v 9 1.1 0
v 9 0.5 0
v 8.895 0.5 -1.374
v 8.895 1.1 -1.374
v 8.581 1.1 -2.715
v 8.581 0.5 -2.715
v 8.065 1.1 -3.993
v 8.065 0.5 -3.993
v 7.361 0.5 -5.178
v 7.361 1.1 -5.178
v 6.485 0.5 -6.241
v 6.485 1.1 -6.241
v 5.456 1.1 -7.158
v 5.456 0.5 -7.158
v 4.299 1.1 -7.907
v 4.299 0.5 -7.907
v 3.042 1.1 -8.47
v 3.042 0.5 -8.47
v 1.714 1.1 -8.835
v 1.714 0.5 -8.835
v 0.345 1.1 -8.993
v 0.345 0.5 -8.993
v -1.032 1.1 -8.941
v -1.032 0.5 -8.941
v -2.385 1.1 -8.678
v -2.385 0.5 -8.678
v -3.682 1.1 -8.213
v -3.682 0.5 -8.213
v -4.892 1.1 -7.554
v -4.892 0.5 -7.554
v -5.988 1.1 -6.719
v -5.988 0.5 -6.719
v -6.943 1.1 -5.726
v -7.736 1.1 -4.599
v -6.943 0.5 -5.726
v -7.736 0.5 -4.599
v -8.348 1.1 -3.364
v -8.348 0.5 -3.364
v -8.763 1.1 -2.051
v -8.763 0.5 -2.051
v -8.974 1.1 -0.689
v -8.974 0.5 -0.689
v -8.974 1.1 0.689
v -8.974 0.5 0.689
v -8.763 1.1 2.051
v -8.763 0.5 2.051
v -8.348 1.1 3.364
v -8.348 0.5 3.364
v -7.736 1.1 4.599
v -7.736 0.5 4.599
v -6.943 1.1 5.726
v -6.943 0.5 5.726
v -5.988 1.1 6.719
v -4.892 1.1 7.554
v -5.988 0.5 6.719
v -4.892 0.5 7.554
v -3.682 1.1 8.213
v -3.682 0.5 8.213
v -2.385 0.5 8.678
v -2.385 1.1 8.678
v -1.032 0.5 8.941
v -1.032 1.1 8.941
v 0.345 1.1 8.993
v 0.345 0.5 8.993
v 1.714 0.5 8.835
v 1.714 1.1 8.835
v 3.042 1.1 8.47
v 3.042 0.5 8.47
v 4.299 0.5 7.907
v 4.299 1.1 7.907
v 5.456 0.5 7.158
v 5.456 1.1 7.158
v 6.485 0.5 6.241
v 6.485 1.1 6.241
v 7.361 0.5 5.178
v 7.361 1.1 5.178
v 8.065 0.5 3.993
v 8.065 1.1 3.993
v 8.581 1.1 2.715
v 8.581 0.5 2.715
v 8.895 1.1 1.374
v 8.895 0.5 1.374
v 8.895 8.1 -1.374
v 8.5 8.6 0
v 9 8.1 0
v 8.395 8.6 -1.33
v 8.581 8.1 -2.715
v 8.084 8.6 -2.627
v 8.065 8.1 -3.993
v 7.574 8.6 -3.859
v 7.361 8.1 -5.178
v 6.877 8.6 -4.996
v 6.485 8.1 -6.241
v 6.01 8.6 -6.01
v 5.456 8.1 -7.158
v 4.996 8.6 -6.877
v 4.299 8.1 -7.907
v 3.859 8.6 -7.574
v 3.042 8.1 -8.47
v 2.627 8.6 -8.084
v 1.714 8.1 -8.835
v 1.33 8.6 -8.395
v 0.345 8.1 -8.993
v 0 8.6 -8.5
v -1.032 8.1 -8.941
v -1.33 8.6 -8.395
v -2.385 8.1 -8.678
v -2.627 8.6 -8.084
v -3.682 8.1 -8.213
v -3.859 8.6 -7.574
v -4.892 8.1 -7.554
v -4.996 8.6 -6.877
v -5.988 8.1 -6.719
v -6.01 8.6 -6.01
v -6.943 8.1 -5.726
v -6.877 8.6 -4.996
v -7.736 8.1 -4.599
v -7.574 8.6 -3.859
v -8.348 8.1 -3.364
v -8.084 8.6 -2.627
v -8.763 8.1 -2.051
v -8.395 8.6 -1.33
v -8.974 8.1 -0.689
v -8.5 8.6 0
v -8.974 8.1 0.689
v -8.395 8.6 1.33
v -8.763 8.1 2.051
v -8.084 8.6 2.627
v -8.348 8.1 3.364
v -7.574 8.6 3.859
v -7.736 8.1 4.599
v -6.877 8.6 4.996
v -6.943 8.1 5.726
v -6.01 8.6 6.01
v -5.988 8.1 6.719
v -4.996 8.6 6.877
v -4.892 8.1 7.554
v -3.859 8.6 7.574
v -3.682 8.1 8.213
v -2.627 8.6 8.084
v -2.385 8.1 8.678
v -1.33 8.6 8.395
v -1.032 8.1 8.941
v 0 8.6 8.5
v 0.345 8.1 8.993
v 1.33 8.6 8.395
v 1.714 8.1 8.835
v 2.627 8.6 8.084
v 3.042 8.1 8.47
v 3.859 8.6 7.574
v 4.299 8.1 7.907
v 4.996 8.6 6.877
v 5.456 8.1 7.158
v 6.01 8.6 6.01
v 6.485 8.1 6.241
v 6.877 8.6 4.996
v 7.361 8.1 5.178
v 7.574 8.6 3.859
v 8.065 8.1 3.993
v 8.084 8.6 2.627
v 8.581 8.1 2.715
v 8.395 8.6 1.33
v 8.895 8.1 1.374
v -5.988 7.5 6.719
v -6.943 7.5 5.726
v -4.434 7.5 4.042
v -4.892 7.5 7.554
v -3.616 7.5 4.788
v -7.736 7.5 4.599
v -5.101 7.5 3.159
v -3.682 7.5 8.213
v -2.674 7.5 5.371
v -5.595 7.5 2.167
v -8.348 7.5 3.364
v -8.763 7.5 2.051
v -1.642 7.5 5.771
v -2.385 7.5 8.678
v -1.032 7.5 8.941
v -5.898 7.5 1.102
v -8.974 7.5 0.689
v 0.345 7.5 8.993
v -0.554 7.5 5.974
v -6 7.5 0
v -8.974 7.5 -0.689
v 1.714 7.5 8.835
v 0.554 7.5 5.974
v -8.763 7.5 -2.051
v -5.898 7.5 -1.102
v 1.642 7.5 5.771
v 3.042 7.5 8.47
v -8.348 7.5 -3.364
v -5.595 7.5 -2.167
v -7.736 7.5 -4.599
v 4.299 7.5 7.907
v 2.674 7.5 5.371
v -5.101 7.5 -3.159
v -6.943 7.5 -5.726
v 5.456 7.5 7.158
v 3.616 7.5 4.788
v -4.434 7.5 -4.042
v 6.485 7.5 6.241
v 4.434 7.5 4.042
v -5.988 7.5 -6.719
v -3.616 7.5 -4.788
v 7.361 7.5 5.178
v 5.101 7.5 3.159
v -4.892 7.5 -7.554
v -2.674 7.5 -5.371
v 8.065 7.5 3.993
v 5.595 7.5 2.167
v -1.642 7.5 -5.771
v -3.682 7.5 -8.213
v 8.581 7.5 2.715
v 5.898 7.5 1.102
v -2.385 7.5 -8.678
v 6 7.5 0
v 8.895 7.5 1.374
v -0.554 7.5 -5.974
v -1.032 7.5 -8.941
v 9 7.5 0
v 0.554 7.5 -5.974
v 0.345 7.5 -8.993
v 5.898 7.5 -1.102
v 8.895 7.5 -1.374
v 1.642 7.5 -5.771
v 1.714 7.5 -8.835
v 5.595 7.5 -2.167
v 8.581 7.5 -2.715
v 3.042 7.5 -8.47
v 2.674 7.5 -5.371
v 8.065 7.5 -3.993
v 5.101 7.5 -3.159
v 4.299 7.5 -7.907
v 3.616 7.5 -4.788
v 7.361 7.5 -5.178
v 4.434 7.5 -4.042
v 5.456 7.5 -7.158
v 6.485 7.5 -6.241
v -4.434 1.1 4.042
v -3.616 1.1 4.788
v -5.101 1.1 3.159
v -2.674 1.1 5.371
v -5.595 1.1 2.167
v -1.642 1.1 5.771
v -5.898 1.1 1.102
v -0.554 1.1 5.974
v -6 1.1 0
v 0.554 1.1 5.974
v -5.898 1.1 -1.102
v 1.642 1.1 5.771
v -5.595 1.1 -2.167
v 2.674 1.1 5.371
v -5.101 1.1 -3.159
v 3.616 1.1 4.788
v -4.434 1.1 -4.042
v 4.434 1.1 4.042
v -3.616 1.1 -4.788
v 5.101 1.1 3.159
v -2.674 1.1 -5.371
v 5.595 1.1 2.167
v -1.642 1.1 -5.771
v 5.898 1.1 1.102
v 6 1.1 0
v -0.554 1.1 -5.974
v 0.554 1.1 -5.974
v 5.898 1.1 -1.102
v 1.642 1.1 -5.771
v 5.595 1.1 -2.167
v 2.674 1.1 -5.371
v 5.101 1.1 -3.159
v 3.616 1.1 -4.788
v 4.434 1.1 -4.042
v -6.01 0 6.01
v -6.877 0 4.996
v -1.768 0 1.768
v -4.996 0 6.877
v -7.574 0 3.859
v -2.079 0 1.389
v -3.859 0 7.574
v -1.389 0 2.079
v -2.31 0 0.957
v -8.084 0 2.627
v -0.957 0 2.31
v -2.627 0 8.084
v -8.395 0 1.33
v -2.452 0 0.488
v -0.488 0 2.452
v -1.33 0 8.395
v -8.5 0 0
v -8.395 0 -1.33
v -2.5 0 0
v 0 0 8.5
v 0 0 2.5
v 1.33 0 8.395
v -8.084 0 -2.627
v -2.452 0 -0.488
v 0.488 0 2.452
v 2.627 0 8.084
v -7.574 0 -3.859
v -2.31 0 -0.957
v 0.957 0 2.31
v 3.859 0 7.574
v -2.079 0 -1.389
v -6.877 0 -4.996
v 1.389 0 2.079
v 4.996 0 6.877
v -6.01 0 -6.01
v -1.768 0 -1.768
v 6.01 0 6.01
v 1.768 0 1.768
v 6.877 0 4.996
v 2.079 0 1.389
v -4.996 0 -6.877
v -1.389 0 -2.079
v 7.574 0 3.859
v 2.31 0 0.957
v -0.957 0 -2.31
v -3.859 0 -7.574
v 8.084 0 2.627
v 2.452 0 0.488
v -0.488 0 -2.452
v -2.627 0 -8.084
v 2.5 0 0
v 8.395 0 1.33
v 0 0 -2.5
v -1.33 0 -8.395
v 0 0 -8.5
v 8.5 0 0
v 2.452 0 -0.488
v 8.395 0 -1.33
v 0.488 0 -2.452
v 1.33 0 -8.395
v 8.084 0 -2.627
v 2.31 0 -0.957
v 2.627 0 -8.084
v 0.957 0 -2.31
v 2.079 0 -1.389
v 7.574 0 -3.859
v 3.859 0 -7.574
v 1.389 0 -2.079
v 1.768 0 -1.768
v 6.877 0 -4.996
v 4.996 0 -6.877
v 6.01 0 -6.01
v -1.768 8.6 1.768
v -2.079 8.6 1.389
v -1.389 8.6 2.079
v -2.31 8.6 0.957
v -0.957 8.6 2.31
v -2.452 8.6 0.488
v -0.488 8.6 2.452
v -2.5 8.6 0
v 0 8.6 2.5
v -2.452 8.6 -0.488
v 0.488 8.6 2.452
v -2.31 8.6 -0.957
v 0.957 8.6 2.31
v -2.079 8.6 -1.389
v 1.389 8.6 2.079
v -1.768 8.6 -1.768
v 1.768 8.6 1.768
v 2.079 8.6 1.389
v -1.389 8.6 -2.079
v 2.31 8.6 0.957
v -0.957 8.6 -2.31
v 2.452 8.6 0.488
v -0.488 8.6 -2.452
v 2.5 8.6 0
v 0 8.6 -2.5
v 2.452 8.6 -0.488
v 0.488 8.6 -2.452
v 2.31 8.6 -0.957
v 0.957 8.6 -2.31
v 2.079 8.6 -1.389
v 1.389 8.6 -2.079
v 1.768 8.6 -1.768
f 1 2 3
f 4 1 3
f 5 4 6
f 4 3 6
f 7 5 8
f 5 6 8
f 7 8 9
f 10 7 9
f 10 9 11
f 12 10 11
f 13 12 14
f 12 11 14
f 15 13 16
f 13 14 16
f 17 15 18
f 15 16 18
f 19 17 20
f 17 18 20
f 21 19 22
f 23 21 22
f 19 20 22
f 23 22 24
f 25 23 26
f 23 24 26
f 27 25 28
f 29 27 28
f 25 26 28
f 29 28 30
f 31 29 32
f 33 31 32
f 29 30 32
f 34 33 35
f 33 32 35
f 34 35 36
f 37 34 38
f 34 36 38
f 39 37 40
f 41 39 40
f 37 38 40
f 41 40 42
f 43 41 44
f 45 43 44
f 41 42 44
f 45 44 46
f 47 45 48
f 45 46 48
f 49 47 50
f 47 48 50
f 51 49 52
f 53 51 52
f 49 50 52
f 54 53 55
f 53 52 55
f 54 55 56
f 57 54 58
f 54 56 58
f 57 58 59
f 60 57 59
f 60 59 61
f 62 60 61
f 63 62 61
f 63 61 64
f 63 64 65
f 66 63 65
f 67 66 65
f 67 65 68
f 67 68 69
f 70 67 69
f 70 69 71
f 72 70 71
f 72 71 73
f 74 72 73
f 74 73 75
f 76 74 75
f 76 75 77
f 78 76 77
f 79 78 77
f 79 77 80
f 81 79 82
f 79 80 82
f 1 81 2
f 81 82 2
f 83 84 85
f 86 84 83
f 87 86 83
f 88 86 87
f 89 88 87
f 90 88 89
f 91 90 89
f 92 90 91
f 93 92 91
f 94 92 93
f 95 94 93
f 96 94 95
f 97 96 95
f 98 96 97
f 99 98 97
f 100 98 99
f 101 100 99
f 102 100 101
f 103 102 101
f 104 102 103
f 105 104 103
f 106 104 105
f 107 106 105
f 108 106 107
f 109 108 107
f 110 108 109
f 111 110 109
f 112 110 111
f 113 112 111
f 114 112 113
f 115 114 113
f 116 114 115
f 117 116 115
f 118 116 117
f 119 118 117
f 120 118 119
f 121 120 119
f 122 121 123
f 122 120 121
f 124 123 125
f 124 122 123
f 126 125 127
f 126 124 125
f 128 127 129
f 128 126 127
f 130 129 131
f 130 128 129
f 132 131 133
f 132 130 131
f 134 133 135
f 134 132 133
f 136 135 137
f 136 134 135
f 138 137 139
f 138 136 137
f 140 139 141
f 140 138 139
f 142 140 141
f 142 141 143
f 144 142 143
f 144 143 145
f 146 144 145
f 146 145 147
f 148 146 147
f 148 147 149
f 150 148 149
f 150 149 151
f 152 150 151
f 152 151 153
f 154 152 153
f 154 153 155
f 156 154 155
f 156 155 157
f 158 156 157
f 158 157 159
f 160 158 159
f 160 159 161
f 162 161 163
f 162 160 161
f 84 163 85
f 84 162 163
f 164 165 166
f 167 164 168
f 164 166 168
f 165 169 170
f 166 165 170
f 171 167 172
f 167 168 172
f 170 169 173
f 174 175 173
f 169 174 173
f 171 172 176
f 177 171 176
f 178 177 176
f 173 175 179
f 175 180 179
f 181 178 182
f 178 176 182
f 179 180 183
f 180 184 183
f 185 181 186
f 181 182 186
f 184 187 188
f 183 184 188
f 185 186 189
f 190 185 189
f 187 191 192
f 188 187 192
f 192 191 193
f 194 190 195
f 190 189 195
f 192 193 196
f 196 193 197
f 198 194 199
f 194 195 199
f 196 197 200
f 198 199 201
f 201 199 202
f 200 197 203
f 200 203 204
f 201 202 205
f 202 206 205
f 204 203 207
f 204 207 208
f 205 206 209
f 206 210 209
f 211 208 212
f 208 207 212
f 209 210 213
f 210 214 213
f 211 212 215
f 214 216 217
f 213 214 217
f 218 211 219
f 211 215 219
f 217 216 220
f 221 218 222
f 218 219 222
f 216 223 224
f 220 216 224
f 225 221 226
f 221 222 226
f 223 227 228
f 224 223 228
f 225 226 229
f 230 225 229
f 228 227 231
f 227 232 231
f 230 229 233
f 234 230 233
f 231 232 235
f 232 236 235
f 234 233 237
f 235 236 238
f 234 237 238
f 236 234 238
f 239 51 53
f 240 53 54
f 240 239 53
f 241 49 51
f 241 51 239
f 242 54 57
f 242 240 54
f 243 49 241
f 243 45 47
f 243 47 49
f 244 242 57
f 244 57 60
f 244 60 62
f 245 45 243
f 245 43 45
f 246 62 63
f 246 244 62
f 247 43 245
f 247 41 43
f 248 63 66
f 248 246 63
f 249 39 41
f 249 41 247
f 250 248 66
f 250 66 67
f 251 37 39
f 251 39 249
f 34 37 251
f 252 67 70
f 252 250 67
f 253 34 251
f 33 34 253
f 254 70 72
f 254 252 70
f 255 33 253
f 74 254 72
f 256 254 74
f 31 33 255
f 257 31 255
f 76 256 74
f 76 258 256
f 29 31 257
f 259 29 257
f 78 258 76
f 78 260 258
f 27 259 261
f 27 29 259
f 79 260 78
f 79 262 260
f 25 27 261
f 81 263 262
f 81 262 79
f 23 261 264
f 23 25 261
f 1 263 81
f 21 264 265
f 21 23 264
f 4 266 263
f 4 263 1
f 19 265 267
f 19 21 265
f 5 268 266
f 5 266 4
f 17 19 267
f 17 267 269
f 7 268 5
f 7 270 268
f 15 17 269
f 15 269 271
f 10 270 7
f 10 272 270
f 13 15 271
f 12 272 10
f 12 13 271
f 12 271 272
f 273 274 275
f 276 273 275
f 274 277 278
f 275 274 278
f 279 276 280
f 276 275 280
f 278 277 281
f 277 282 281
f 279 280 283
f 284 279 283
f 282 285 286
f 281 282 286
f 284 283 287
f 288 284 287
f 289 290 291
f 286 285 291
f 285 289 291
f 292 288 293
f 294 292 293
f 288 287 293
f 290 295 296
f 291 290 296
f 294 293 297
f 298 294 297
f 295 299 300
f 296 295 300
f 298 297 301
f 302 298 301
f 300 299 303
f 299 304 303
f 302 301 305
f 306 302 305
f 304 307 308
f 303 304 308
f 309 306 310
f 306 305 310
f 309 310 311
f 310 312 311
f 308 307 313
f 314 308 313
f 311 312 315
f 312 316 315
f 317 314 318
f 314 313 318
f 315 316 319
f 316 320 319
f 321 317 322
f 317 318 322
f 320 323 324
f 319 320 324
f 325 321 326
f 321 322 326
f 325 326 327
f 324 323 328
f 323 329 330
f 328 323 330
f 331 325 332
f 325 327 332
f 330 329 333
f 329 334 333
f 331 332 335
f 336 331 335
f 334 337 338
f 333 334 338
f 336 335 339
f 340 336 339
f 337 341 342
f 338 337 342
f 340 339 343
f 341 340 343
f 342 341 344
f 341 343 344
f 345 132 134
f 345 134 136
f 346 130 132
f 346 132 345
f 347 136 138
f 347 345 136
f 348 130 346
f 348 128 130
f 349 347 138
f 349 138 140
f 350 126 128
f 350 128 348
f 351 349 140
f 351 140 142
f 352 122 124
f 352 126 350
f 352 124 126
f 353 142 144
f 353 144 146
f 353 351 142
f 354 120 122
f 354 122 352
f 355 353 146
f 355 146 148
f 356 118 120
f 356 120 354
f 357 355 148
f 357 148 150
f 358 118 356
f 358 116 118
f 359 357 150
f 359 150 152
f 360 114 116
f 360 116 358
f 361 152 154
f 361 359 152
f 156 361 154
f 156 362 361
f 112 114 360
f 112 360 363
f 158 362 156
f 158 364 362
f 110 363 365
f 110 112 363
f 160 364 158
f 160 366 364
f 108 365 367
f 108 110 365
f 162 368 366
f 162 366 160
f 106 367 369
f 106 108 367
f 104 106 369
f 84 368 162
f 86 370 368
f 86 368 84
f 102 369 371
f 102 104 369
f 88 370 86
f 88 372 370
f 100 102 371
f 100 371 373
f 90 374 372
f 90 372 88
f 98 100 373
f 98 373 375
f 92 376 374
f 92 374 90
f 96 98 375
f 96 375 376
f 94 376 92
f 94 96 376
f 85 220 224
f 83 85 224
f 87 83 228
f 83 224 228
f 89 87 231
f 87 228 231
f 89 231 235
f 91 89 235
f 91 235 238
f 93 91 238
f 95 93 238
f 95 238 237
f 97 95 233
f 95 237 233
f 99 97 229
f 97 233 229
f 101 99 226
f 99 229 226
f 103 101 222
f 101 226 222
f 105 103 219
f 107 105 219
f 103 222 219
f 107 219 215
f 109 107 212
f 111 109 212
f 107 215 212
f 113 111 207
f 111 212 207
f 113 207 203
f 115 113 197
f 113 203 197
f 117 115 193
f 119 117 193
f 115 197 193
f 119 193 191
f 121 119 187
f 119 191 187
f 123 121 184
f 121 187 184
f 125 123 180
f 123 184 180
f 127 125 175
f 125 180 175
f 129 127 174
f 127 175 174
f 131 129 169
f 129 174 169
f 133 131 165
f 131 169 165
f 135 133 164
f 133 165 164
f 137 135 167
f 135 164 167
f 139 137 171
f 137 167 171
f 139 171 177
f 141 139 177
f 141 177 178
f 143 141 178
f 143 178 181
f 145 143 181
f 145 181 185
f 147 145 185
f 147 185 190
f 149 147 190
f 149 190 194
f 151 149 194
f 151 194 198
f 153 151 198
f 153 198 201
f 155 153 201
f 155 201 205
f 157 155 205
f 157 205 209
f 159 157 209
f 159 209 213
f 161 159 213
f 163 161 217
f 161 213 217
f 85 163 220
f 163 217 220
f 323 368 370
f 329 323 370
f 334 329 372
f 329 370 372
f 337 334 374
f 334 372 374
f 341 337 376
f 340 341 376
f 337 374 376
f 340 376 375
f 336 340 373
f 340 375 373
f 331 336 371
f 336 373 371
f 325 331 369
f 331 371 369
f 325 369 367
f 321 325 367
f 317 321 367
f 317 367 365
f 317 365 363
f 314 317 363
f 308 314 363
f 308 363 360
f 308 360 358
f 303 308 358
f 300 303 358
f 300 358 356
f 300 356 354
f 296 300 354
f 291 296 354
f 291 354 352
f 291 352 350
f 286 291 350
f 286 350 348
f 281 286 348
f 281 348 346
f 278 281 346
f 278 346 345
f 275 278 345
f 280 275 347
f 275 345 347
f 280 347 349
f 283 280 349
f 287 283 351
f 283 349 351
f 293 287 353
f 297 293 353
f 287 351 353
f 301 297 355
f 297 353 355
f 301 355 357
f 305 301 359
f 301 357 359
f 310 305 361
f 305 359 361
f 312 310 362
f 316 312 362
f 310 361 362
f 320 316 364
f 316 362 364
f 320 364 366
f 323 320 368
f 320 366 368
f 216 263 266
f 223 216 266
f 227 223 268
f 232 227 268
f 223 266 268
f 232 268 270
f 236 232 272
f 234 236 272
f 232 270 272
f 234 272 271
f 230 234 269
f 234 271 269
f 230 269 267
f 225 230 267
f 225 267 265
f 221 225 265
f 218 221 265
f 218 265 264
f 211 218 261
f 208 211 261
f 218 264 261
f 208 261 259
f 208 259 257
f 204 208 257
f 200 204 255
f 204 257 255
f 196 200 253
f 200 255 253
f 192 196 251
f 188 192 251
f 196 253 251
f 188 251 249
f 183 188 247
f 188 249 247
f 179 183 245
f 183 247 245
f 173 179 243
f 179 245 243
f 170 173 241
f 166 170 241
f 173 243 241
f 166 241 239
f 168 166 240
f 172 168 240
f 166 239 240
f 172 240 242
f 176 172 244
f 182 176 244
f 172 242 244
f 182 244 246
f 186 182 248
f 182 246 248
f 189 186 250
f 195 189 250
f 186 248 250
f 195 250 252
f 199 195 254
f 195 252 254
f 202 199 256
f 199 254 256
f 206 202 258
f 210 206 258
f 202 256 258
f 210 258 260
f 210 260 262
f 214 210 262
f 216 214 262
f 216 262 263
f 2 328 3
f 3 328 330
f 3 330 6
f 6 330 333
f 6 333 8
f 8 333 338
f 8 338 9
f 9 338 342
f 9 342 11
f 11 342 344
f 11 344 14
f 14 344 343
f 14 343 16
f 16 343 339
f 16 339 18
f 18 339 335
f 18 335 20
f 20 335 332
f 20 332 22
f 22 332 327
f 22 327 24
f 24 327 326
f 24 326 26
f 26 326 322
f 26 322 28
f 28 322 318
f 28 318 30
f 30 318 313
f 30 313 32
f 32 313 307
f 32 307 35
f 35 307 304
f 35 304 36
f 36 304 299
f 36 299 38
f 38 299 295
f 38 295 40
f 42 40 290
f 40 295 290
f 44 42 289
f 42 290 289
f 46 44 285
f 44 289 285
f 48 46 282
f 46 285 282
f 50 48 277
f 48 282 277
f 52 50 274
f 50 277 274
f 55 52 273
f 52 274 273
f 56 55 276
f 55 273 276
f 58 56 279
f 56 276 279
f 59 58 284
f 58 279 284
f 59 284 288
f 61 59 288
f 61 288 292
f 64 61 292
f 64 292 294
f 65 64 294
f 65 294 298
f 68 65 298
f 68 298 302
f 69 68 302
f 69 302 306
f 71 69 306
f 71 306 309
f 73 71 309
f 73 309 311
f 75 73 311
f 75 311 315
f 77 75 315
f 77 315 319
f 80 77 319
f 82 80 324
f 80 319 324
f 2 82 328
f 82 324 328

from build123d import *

# Parameters (mm, degrees)
SKETCH_1_R          = 9
EXTRUDE_1_DEPTH     = 1.1
SKETCH_2_R          = 6
EXTRUDE_2_DEPTH     = 6.4
SKETCH_3_R          = 9
EXTRUDE_3_DEPTH     = 1.1
CHAMFER_1_SIZE      = 0.5
SKETCH_4_R          = 2.5
CUT_EXTRUDE_1_DEPTH = 9.6


with BuildPart() as part:
    # 草图1 → 凸台-拉伸1 (new body)
    with BuildSketch(Plane(origin=(0, 0, 0), x_dir=(1, 0, 0), z_dir=(0, 1, 0))):
        Circle(SKETCH_1_R)
    extrude(amount=EXTRUDE_1_DEPTH)

    # 草图2 → 凸台-拉伸2 (add)
    with BuildSketch(Plane(origin=(0, 1.1, 0), x_dir=(1, 0, 0), z_dir=(0, 1, 0))):
        Circle(SKETCH_2_R)
    extrude(amount=EXTRUDE_2_DEPTH)

    # 草图3 → 凸台-拉伸3 (add)
    with BuildSketch(Plane(origin=(0, 7.5, 0), x_dir=(1, 0, 0), z_dir=(0, 1, 0))):
        Circle(SKETCH_3_R)
    extrude(amount=EXTRUDE_3_DEPTH)

    # 倒角1
    chamfer_1_edges = [part.edges().sort_by_distance(p)[0] for p in [
        (-9, 0, 0),
        (-9, 8.6, 0),
    ]]
    chamfer(chamfer_1_edges, length=CHAMFER_1_SIZE)

    # 草图4 → 切除-拉伸1 (cut, through all)
    with BuildSketch(Plane(origin=(0, 8.6, 0), x_dir=(1, 0, 0), z_dir=(0, 1, 0))):
        Circle(SKETCH_4_R)
    extrude(amount=-CUT_EXTRUDE_1_DEPTH, mode=Mode.SUBTRACT)


solid = part.part
